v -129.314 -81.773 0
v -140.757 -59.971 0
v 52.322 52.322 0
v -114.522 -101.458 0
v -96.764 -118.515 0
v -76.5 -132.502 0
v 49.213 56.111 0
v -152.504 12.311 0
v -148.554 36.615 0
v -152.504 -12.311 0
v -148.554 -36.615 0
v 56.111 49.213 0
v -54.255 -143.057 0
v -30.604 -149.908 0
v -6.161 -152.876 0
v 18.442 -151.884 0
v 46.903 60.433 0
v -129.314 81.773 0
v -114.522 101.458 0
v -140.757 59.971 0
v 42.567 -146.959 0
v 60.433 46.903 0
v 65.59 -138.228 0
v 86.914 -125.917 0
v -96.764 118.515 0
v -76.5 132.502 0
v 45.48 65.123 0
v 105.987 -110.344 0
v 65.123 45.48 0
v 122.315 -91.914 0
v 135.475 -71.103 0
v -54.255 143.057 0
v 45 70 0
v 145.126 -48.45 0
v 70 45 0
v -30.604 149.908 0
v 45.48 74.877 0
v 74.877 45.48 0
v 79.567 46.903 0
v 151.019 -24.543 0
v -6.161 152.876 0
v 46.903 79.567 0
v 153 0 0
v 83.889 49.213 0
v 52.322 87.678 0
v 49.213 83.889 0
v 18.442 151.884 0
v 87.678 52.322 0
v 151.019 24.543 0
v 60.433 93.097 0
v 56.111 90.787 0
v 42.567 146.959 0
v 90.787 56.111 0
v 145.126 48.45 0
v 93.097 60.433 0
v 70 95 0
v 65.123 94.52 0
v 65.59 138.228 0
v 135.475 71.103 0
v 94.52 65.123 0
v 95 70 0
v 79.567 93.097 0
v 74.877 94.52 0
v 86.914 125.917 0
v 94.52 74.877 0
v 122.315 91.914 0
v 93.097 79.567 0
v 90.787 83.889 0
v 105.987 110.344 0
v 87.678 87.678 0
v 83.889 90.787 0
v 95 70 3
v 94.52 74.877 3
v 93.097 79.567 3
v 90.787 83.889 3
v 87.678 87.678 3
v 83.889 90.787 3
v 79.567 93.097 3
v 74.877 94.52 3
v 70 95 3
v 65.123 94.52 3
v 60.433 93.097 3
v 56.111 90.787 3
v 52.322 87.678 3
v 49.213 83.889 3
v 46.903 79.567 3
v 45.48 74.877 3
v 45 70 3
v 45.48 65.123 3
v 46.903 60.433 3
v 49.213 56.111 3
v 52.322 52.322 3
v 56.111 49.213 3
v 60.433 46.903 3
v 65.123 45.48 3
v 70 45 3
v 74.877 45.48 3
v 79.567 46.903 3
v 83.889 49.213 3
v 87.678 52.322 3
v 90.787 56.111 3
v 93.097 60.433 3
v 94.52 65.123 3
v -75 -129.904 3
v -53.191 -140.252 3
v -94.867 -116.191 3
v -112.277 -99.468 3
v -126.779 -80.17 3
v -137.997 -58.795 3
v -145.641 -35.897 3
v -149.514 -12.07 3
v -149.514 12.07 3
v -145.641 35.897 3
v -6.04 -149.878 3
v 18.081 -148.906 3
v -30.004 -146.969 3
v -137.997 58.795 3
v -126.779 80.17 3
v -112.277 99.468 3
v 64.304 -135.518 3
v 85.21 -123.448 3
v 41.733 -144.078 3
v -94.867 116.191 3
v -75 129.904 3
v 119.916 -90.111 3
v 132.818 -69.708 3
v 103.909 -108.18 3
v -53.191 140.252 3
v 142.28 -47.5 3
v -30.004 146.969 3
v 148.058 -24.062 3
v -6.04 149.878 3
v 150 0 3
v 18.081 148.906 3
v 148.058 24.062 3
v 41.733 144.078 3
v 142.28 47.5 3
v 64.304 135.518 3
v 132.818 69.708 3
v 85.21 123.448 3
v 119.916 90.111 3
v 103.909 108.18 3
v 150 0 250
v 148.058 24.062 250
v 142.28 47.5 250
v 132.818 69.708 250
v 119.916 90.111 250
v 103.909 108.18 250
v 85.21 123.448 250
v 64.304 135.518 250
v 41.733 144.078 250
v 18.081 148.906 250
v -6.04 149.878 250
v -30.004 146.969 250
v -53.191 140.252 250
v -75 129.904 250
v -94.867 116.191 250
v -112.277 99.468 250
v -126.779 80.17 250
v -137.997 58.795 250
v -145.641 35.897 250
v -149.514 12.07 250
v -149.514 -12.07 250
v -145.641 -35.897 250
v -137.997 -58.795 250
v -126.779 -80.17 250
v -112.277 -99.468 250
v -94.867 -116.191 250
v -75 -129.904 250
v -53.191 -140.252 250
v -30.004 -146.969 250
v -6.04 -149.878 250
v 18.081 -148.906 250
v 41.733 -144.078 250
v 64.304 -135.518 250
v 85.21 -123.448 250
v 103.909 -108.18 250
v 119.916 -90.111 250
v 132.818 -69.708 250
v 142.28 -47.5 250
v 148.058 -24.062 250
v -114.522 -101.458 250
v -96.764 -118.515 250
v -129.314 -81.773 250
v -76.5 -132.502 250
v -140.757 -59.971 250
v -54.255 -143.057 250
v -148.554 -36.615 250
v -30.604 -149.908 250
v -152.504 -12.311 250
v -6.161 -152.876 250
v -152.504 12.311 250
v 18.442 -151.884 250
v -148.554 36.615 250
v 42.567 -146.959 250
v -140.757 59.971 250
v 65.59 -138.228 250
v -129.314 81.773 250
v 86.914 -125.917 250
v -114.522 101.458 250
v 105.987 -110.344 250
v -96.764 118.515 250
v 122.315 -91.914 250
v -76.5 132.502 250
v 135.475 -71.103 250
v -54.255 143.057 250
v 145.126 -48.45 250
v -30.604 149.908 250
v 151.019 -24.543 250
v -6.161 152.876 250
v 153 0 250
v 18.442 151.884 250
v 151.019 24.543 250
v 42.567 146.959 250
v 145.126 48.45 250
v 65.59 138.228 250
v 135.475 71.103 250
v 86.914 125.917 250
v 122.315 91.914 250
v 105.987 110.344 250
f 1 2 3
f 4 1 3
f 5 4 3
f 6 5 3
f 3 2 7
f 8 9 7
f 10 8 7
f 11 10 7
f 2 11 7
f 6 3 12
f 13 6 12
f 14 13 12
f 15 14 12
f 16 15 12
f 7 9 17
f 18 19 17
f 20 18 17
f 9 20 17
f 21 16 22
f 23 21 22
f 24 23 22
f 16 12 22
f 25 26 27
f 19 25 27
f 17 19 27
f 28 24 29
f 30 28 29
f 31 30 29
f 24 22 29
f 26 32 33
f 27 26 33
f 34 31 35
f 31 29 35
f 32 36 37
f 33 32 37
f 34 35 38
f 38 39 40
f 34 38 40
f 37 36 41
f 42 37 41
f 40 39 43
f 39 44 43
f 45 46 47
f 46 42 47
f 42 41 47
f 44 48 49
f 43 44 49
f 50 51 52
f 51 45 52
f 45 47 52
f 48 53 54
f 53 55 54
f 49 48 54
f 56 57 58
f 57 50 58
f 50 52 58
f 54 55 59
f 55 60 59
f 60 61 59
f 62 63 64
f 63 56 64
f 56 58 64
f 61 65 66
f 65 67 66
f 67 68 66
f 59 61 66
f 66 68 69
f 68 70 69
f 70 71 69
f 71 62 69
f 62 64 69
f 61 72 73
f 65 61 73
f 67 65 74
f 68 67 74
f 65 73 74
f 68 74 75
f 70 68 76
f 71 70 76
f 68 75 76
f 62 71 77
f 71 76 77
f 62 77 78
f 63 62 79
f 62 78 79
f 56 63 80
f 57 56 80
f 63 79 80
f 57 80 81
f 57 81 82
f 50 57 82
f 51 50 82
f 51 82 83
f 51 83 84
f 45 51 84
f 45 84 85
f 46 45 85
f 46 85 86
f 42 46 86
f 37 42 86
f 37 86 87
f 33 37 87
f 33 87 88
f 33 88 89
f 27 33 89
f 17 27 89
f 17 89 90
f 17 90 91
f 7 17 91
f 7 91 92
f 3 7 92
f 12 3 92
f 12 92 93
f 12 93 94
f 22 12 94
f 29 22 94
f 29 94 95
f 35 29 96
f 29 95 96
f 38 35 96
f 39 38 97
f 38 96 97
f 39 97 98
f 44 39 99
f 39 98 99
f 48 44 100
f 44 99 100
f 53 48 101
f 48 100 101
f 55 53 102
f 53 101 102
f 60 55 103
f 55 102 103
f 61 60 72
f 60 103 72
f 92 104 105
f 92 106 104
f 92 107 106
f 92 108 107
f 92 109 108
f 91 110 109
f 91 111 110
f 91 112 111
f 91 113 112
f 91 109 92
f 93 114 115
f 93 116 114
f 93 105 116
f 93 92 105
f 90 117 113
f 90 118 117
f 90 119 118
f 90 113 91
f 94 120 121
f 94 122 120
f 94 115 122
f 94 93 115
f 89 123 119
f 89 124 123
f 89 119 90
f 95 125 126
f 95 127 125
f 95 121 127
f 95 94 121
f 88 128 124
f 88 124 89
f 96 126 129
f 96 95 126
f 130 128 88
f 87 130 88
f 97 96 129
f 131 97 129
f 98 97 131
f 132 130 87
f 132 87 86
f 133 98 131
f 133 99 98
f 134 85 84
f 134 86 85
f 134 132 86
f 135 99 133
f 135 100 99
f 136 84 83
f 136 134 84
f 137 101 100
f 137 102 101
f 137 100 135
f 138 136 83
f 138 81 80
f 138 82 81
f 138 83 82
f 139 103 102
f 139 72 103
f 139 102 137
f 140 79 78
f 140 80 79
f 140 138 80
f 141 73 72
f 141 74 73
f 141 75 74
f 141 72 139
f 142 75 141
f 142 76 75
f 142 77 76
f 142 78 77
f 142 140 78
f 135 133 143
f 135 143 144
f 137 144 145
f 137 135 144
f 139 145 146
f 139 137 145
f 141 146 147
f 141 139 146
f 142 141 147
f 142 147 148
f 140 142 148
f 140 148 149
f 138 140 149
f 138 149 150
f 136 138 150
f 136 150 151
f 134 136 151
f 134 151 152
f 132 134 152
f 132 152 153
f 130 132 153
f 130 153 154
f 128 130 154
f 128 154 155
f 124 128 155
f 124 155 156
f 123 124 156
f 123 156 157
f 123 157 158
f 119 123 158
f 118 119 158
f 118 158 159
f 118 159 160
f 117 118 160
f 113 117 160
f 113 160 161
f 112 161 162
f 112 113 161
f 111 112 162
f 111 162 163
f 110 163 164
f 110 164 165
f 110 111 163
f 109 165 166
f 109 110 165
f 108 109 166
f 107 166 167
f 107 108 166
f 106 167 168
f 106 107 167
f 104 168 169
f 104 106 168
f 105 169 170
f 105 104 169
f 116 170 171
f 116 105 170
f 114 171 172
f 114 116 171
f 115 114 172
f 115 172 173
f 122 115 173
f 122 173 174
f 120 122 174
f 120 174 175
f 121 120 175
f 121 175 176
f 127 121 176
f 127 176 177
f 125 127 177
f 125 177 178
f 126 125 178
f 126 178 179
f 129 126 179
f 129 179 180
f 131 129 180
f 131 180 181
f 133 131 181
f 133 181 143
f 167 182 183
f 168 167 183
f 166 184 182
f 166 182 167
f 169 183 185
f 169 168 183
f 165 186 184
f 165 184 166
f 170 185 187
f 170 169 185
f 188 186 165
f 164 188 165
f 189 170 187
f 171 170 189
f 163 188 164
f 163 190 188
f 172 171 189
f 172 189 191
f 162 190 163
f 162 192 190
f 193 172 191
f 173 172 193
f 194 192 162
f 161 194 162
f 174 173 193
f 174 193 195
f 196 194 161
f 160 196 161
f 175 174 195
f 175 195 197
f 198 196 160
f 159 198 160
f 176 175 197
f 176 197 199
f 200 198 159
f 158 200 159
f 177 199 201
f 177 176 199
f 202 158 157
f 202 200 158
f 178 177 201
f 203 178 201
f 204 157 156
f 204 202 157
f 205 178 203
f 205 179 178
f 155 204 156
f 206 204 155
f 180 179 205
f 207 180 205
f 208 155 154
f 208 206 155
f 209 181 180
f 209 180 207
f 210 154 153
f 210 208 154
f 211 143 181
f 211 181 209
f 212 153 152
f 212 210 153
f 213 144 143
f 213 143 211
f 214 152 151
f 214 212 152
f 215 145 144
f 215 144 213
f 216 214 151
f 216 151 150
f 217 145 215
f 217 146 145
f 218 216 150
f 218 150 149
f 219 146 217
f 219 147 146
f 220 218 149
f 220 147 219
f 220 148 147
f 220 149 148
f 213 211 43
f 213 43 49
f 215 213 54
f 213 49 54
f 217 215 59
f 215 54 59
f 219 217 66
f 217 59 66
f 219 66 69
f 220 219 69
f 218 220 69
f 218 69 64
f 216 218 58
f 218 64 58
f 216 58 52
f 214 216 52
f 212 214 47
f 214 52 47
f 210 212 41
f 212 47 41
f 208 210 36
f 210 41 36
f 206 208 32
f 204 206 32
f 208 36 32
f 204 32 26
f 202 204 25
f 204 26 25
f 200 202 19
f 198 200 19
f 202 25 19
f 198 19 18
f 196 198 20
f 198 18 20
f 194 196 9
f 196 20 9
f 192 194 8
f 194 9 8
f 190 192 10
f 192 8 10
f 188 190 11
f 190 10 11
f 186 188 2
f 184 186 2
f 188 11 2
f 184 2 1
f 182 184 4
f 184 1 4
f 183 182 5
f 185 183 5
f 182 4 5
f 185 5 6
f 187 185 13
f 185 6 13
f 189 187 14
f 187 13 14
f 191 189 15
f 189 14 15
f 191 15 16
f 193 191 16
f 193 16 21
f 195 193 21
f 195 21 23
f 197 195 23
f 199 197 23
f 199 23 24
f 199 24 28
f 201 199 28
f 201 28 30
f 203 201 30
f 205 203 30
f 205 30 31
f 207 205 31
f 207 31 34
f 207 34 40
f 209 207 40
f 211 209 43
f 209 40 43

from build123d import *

# Parameters (mm, degrees)
F0_R     = 153
F1_DEPTH = 250
F2_T     = -3
F3_R     = 25
F4_DEPTH = 25


with BuildPart() as f1:
    # F0 (on Top) → F1 (new body)
    with BuildSketch(Plane.XY):
        Circle(F0_R)
    extrude(amount=F1_DEPTH)

    # F2
    f2_openings = [f1.faces().sort_by_distance(p)[0] for p in [
        (0, 0, 250),
    ]]
    offset(amount=F2_T, openings=f2_openings)

    # F3 (on face) → F4 (cut)
    with BuildSketch(Plane.XY.offset(3)):
        with Locations((70, 70)):
            Circle(F3_R)
    extrude(amount=-F4_DEPTH, mode=Mode.SUBTRACT)


solid = f1.part
